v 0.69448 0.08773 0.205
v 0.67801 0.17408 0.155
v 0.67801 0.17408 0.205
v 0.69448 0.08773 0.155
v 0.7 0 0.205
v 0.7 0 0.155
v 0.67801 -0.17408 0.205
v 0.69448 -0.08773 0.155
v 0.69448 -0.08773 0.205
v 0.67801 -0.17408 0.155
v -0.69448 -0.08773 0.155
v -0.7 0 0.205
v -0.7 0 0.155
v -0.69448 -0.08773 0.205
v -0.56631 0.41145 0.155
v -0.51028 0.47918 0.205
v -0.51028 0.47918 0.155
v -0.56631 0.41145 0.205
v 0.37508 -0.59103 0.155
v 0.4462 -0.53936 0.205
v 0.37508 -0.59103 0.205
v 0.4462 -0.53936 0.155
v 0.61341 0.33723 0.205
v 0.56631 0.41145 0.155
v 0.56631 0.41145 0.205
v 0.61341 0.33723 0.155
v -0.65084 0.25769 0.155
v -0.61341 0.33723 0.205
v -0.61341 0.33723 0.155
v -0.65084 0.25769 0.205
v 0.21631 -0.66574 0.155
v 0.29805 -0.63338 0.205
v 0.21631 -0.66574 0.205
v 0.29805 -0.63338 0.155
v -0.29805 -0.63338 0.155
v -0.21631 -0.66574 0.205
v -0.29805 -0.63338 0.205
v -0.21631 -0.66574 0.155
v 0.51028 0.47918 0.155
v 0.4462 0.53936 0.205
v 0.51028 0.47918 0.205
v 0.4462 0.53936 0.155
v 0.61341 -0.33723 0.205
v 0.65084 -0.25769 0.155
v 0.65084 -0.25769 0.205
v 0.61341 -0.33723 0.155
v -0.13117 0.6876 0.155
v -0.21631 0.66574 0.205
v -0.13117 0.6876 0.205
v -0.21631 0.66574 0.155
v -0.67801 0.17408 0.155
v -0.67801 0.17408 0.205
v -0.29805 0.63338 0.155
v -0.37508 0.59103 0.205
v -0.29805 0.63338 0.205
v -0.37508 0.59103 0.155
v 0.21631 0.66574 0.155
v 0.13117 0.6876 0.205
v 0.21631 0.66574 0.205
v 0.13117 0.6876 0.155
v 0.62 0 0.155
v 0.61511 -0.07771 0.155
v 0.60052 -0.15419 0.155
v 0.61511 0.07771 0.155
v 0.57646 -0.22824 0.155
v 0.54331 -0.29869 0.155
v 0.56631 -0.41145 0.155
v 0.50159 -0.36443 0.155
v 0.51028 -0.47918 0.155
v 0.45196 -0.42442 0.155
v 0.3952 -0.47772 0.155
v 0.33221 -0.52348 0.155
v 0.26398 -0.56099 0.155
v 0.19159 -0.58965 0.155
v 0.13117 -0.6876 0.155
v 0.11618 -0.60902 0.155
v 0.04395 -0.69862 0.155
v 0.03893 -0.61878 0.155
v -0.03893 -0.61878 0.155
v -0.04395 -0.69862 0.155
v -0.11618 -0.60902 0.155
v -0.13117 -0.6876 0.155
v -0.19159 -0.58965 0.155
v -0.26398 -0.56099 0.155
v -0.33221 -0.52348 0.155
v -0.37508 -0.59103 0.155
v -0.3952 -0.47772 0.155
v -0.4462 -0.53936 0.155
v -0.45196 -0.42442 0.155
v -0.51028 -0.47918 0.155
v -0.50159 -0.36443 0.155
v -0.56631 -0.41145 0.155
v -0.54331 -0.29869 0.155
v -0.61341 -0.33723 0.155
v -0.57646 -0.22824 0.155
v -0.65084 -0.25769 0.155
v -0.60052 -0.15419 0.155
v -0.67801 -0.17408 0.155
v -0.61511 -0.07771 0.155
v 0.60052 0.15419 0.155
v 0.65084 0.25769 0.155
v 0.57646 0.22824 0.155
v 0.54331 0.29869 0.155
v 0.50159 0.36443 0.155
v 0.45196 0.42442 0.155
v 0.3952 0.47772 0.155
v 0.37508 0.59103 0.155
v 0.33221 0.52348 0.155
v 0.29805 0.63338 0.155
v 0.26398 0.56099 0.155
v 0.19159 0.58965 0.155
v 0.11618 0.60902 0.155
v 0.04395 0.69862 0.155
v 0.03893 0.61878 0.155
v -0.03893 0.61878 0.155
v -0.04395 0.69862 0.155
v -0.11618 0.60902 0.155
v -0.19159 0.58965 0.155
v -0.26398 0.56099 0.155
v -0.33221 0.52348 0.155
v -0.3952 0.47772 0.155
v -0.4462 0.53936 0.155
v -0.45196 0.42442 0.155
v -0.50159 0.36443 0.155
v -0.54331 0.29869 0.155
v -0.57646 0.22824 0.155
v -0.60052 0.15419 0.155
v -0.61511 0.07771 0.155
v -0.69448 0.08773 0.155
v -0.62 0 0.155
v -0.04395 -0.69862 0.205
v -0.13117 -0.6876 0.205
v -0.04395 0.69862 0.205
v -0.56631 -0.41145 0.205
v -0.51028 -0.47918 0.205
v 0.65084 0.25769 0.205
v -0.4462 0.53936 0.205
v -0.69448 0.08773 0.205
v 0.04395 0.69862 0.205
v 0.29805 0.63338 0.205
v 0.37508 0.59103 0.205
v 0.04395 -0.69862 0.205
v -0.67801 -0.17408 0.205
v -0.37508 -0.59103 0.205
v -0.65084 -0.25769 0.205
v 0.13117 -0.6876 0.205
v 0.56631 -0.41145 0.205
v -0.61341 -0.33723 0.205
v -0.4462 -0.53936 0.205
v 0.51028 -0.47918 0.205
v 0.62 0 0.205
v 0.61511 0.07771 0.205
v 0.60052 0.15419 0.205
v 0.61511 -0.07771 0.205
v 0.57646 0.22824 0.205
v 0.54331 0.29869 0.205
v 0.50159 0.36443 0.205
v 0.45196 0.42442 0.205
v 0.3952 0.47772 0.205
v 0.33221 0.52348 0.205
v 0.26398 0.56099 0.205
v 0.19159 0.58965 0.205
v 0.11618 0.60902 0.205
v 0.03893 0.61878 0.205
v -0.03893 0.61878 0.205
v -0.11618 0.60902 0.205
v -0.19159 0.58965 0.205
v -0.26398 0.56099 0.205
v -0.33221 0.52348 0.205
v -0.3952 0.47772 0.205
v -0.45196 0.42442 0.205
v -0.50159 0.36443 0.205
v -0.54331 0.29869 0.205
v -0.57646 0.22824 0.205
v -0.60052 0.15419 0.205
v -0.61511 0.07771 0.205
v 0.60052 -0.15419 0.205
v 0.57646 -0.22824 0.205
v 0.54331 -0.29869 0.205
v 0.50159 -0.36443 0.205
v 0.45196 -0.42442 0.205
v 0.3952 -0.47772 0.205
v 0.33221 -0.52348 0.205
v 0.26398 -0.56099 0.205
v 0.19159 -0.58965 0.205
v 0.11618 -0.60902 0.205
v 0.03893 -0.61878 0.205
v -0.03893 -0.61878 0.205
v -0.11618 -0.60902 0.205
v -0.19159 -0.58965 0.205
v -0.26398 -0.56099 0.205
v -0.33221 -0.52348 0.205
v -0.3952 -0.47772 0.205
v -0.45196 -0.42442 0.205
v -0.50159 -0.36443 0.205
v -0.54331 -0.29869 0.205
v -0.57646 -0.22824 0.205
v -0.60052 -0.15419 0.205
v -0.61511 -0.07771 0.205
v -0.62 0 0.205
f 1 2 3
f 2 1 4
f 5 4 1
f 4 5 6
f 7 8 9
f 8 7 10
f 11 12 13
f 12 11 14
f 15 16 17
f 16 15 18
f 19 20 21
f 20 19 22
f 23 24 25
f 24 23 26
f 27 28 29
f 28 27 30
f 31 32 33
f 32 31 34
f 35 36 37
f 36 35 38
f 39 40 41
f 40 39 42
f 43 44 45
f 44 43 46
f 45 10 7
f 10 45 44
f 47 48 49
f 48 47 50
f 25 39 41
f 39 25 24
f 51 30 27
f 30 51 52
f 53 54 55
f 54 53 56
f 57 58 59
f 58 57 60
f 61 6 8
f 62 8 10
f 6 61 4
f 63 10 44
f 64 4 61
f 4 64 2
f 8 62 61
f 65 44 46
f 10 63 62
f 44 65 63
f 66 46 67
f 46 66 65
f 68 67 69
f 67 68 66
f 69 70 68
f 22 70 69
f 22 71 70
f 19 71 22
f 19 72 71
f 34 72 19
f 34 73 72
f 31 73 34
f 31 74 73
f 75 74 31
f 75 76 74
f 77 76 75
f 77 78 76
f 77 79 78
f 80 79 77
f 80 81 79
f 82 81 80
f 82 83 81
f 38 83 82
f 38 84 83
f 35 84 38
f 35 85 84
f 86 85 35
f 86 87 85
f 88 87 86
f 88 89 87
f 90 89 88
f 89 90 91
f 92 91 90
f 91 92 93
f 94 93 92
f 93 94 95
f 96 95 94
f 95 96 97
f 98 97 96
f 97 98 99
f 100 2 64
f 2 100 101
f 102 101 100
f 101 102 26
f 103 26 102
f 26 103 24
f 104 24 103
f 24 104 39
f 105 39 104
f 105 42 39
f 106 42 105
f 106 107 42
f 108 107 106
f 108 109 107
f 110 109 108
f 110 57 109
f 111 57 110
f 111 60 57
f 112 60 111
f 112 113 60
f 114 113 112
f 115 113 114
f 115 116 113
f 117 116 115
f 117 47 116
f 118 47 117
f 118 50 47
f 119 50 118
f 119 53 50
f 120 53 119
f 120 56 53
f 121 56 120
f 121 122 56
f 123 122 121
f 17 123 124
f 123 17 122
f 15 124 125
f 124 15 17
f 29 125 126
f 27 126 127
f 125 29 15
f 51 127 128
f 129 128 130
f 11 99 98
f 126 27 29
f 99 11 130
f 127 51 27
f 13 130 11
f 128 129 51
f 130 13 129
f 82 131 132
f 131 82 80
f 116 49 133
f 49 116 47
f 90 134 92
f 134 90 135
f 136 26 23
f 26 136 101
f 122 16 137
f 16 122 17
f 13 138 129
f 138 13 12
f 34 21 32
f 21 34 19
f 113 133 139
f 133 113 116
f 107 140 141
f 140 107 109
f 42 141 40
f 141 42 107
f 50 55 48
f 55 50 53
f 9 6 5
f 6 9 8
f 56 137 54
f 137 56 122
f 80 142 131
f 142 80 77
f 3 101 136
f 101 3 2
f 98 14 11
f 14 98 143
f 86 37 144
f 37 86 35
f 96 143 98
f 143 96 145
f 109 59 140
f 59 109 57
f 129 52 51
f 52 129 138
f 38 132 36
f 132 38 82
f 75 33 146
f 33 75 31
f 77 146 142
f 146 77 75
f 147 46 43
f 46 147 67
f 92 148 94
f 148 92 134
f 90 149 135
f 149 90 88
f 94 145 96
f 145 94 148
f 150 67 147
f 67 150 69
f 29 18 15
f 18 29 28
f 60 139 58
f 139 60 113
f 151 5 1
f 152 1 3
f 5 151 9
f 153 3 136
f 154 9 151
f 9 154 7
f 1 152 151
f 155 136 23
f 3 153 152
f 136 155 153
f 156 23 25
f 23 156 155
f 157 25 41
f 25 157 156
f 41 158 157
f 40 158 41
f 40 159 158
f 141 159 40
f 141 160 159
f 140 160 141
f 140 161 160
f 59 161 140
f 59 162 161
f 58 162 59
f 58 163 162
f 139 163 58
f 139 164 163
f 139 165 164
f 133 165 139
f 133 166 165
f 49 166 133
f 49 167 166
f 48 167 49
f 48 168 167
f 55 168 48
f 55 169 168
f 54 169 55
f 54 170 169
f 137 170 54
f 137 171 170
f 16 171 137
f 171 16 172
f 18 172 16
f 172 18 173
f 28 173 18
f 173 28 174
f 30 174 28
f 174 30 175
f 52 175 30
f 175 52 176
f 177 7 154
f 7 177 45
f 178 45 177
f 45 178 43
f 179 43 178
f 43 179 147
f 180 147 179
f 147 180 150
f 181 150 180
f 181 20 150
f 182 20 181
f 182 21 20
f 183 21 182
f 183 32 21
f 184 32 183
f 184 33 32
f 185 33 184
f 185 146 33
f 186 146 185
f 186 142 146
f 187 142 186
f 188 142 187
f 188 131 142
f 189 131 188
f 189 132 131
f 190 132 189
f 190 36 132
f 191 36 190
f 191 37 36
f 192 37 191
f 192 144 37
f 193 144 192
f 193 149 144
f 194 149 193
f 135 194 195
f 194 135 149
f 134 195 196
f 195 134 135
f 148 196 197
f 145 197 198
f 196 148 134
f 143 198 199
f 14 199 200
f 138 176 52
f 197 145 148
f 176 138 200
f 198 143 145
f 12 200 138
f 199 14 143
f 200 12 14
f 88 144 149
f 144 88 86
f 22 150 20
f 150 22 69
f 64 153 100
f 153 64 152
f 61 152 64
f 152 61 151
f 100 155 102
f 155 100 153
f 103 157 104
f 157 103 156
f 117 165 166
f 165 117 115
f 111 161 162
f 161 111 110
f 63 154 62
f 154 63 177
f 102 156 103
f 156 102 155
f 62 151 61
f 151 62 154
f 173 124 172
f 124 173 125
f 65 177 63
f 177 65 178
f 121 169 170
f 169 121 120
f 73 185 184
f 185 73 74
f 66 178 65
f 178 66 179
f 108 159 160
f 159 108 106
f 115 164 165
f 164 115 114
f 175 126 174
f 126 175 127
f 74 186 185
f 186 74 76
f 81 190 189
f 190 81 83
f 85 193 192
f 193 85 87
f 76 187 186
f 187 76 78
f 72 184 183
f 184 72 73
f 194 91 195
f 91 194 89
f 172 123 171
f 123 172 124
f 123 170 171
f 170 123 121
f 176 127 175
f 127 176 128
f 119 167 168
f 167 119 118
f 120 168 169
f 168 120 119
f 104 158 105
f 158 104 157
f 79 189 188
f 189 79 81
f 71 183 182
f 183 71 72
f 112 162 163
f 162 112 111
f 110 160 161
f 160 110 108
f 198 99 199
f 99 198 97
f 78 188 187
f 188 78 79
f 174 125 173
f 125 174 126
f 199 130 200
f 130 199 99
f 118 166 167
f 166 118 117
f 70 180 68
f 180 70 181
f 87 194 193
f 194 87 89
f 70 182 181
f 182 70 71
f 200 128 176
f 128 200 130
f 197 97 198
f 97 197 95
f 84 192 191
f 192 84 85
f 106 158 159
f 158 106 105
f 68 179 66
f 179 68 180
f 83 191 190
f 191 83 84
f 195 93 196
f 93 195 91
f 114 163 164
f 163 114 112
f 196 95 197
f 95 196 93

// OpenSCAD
difference() {
    translate([0,0,0.18])
        cylinder(h = 0.05, r = .7, center = true, $fn = 50);
    translate([0,0,0.18])
        cylinder(h = 0.5, r = 0.62, center = true, $fn = 50);
}
